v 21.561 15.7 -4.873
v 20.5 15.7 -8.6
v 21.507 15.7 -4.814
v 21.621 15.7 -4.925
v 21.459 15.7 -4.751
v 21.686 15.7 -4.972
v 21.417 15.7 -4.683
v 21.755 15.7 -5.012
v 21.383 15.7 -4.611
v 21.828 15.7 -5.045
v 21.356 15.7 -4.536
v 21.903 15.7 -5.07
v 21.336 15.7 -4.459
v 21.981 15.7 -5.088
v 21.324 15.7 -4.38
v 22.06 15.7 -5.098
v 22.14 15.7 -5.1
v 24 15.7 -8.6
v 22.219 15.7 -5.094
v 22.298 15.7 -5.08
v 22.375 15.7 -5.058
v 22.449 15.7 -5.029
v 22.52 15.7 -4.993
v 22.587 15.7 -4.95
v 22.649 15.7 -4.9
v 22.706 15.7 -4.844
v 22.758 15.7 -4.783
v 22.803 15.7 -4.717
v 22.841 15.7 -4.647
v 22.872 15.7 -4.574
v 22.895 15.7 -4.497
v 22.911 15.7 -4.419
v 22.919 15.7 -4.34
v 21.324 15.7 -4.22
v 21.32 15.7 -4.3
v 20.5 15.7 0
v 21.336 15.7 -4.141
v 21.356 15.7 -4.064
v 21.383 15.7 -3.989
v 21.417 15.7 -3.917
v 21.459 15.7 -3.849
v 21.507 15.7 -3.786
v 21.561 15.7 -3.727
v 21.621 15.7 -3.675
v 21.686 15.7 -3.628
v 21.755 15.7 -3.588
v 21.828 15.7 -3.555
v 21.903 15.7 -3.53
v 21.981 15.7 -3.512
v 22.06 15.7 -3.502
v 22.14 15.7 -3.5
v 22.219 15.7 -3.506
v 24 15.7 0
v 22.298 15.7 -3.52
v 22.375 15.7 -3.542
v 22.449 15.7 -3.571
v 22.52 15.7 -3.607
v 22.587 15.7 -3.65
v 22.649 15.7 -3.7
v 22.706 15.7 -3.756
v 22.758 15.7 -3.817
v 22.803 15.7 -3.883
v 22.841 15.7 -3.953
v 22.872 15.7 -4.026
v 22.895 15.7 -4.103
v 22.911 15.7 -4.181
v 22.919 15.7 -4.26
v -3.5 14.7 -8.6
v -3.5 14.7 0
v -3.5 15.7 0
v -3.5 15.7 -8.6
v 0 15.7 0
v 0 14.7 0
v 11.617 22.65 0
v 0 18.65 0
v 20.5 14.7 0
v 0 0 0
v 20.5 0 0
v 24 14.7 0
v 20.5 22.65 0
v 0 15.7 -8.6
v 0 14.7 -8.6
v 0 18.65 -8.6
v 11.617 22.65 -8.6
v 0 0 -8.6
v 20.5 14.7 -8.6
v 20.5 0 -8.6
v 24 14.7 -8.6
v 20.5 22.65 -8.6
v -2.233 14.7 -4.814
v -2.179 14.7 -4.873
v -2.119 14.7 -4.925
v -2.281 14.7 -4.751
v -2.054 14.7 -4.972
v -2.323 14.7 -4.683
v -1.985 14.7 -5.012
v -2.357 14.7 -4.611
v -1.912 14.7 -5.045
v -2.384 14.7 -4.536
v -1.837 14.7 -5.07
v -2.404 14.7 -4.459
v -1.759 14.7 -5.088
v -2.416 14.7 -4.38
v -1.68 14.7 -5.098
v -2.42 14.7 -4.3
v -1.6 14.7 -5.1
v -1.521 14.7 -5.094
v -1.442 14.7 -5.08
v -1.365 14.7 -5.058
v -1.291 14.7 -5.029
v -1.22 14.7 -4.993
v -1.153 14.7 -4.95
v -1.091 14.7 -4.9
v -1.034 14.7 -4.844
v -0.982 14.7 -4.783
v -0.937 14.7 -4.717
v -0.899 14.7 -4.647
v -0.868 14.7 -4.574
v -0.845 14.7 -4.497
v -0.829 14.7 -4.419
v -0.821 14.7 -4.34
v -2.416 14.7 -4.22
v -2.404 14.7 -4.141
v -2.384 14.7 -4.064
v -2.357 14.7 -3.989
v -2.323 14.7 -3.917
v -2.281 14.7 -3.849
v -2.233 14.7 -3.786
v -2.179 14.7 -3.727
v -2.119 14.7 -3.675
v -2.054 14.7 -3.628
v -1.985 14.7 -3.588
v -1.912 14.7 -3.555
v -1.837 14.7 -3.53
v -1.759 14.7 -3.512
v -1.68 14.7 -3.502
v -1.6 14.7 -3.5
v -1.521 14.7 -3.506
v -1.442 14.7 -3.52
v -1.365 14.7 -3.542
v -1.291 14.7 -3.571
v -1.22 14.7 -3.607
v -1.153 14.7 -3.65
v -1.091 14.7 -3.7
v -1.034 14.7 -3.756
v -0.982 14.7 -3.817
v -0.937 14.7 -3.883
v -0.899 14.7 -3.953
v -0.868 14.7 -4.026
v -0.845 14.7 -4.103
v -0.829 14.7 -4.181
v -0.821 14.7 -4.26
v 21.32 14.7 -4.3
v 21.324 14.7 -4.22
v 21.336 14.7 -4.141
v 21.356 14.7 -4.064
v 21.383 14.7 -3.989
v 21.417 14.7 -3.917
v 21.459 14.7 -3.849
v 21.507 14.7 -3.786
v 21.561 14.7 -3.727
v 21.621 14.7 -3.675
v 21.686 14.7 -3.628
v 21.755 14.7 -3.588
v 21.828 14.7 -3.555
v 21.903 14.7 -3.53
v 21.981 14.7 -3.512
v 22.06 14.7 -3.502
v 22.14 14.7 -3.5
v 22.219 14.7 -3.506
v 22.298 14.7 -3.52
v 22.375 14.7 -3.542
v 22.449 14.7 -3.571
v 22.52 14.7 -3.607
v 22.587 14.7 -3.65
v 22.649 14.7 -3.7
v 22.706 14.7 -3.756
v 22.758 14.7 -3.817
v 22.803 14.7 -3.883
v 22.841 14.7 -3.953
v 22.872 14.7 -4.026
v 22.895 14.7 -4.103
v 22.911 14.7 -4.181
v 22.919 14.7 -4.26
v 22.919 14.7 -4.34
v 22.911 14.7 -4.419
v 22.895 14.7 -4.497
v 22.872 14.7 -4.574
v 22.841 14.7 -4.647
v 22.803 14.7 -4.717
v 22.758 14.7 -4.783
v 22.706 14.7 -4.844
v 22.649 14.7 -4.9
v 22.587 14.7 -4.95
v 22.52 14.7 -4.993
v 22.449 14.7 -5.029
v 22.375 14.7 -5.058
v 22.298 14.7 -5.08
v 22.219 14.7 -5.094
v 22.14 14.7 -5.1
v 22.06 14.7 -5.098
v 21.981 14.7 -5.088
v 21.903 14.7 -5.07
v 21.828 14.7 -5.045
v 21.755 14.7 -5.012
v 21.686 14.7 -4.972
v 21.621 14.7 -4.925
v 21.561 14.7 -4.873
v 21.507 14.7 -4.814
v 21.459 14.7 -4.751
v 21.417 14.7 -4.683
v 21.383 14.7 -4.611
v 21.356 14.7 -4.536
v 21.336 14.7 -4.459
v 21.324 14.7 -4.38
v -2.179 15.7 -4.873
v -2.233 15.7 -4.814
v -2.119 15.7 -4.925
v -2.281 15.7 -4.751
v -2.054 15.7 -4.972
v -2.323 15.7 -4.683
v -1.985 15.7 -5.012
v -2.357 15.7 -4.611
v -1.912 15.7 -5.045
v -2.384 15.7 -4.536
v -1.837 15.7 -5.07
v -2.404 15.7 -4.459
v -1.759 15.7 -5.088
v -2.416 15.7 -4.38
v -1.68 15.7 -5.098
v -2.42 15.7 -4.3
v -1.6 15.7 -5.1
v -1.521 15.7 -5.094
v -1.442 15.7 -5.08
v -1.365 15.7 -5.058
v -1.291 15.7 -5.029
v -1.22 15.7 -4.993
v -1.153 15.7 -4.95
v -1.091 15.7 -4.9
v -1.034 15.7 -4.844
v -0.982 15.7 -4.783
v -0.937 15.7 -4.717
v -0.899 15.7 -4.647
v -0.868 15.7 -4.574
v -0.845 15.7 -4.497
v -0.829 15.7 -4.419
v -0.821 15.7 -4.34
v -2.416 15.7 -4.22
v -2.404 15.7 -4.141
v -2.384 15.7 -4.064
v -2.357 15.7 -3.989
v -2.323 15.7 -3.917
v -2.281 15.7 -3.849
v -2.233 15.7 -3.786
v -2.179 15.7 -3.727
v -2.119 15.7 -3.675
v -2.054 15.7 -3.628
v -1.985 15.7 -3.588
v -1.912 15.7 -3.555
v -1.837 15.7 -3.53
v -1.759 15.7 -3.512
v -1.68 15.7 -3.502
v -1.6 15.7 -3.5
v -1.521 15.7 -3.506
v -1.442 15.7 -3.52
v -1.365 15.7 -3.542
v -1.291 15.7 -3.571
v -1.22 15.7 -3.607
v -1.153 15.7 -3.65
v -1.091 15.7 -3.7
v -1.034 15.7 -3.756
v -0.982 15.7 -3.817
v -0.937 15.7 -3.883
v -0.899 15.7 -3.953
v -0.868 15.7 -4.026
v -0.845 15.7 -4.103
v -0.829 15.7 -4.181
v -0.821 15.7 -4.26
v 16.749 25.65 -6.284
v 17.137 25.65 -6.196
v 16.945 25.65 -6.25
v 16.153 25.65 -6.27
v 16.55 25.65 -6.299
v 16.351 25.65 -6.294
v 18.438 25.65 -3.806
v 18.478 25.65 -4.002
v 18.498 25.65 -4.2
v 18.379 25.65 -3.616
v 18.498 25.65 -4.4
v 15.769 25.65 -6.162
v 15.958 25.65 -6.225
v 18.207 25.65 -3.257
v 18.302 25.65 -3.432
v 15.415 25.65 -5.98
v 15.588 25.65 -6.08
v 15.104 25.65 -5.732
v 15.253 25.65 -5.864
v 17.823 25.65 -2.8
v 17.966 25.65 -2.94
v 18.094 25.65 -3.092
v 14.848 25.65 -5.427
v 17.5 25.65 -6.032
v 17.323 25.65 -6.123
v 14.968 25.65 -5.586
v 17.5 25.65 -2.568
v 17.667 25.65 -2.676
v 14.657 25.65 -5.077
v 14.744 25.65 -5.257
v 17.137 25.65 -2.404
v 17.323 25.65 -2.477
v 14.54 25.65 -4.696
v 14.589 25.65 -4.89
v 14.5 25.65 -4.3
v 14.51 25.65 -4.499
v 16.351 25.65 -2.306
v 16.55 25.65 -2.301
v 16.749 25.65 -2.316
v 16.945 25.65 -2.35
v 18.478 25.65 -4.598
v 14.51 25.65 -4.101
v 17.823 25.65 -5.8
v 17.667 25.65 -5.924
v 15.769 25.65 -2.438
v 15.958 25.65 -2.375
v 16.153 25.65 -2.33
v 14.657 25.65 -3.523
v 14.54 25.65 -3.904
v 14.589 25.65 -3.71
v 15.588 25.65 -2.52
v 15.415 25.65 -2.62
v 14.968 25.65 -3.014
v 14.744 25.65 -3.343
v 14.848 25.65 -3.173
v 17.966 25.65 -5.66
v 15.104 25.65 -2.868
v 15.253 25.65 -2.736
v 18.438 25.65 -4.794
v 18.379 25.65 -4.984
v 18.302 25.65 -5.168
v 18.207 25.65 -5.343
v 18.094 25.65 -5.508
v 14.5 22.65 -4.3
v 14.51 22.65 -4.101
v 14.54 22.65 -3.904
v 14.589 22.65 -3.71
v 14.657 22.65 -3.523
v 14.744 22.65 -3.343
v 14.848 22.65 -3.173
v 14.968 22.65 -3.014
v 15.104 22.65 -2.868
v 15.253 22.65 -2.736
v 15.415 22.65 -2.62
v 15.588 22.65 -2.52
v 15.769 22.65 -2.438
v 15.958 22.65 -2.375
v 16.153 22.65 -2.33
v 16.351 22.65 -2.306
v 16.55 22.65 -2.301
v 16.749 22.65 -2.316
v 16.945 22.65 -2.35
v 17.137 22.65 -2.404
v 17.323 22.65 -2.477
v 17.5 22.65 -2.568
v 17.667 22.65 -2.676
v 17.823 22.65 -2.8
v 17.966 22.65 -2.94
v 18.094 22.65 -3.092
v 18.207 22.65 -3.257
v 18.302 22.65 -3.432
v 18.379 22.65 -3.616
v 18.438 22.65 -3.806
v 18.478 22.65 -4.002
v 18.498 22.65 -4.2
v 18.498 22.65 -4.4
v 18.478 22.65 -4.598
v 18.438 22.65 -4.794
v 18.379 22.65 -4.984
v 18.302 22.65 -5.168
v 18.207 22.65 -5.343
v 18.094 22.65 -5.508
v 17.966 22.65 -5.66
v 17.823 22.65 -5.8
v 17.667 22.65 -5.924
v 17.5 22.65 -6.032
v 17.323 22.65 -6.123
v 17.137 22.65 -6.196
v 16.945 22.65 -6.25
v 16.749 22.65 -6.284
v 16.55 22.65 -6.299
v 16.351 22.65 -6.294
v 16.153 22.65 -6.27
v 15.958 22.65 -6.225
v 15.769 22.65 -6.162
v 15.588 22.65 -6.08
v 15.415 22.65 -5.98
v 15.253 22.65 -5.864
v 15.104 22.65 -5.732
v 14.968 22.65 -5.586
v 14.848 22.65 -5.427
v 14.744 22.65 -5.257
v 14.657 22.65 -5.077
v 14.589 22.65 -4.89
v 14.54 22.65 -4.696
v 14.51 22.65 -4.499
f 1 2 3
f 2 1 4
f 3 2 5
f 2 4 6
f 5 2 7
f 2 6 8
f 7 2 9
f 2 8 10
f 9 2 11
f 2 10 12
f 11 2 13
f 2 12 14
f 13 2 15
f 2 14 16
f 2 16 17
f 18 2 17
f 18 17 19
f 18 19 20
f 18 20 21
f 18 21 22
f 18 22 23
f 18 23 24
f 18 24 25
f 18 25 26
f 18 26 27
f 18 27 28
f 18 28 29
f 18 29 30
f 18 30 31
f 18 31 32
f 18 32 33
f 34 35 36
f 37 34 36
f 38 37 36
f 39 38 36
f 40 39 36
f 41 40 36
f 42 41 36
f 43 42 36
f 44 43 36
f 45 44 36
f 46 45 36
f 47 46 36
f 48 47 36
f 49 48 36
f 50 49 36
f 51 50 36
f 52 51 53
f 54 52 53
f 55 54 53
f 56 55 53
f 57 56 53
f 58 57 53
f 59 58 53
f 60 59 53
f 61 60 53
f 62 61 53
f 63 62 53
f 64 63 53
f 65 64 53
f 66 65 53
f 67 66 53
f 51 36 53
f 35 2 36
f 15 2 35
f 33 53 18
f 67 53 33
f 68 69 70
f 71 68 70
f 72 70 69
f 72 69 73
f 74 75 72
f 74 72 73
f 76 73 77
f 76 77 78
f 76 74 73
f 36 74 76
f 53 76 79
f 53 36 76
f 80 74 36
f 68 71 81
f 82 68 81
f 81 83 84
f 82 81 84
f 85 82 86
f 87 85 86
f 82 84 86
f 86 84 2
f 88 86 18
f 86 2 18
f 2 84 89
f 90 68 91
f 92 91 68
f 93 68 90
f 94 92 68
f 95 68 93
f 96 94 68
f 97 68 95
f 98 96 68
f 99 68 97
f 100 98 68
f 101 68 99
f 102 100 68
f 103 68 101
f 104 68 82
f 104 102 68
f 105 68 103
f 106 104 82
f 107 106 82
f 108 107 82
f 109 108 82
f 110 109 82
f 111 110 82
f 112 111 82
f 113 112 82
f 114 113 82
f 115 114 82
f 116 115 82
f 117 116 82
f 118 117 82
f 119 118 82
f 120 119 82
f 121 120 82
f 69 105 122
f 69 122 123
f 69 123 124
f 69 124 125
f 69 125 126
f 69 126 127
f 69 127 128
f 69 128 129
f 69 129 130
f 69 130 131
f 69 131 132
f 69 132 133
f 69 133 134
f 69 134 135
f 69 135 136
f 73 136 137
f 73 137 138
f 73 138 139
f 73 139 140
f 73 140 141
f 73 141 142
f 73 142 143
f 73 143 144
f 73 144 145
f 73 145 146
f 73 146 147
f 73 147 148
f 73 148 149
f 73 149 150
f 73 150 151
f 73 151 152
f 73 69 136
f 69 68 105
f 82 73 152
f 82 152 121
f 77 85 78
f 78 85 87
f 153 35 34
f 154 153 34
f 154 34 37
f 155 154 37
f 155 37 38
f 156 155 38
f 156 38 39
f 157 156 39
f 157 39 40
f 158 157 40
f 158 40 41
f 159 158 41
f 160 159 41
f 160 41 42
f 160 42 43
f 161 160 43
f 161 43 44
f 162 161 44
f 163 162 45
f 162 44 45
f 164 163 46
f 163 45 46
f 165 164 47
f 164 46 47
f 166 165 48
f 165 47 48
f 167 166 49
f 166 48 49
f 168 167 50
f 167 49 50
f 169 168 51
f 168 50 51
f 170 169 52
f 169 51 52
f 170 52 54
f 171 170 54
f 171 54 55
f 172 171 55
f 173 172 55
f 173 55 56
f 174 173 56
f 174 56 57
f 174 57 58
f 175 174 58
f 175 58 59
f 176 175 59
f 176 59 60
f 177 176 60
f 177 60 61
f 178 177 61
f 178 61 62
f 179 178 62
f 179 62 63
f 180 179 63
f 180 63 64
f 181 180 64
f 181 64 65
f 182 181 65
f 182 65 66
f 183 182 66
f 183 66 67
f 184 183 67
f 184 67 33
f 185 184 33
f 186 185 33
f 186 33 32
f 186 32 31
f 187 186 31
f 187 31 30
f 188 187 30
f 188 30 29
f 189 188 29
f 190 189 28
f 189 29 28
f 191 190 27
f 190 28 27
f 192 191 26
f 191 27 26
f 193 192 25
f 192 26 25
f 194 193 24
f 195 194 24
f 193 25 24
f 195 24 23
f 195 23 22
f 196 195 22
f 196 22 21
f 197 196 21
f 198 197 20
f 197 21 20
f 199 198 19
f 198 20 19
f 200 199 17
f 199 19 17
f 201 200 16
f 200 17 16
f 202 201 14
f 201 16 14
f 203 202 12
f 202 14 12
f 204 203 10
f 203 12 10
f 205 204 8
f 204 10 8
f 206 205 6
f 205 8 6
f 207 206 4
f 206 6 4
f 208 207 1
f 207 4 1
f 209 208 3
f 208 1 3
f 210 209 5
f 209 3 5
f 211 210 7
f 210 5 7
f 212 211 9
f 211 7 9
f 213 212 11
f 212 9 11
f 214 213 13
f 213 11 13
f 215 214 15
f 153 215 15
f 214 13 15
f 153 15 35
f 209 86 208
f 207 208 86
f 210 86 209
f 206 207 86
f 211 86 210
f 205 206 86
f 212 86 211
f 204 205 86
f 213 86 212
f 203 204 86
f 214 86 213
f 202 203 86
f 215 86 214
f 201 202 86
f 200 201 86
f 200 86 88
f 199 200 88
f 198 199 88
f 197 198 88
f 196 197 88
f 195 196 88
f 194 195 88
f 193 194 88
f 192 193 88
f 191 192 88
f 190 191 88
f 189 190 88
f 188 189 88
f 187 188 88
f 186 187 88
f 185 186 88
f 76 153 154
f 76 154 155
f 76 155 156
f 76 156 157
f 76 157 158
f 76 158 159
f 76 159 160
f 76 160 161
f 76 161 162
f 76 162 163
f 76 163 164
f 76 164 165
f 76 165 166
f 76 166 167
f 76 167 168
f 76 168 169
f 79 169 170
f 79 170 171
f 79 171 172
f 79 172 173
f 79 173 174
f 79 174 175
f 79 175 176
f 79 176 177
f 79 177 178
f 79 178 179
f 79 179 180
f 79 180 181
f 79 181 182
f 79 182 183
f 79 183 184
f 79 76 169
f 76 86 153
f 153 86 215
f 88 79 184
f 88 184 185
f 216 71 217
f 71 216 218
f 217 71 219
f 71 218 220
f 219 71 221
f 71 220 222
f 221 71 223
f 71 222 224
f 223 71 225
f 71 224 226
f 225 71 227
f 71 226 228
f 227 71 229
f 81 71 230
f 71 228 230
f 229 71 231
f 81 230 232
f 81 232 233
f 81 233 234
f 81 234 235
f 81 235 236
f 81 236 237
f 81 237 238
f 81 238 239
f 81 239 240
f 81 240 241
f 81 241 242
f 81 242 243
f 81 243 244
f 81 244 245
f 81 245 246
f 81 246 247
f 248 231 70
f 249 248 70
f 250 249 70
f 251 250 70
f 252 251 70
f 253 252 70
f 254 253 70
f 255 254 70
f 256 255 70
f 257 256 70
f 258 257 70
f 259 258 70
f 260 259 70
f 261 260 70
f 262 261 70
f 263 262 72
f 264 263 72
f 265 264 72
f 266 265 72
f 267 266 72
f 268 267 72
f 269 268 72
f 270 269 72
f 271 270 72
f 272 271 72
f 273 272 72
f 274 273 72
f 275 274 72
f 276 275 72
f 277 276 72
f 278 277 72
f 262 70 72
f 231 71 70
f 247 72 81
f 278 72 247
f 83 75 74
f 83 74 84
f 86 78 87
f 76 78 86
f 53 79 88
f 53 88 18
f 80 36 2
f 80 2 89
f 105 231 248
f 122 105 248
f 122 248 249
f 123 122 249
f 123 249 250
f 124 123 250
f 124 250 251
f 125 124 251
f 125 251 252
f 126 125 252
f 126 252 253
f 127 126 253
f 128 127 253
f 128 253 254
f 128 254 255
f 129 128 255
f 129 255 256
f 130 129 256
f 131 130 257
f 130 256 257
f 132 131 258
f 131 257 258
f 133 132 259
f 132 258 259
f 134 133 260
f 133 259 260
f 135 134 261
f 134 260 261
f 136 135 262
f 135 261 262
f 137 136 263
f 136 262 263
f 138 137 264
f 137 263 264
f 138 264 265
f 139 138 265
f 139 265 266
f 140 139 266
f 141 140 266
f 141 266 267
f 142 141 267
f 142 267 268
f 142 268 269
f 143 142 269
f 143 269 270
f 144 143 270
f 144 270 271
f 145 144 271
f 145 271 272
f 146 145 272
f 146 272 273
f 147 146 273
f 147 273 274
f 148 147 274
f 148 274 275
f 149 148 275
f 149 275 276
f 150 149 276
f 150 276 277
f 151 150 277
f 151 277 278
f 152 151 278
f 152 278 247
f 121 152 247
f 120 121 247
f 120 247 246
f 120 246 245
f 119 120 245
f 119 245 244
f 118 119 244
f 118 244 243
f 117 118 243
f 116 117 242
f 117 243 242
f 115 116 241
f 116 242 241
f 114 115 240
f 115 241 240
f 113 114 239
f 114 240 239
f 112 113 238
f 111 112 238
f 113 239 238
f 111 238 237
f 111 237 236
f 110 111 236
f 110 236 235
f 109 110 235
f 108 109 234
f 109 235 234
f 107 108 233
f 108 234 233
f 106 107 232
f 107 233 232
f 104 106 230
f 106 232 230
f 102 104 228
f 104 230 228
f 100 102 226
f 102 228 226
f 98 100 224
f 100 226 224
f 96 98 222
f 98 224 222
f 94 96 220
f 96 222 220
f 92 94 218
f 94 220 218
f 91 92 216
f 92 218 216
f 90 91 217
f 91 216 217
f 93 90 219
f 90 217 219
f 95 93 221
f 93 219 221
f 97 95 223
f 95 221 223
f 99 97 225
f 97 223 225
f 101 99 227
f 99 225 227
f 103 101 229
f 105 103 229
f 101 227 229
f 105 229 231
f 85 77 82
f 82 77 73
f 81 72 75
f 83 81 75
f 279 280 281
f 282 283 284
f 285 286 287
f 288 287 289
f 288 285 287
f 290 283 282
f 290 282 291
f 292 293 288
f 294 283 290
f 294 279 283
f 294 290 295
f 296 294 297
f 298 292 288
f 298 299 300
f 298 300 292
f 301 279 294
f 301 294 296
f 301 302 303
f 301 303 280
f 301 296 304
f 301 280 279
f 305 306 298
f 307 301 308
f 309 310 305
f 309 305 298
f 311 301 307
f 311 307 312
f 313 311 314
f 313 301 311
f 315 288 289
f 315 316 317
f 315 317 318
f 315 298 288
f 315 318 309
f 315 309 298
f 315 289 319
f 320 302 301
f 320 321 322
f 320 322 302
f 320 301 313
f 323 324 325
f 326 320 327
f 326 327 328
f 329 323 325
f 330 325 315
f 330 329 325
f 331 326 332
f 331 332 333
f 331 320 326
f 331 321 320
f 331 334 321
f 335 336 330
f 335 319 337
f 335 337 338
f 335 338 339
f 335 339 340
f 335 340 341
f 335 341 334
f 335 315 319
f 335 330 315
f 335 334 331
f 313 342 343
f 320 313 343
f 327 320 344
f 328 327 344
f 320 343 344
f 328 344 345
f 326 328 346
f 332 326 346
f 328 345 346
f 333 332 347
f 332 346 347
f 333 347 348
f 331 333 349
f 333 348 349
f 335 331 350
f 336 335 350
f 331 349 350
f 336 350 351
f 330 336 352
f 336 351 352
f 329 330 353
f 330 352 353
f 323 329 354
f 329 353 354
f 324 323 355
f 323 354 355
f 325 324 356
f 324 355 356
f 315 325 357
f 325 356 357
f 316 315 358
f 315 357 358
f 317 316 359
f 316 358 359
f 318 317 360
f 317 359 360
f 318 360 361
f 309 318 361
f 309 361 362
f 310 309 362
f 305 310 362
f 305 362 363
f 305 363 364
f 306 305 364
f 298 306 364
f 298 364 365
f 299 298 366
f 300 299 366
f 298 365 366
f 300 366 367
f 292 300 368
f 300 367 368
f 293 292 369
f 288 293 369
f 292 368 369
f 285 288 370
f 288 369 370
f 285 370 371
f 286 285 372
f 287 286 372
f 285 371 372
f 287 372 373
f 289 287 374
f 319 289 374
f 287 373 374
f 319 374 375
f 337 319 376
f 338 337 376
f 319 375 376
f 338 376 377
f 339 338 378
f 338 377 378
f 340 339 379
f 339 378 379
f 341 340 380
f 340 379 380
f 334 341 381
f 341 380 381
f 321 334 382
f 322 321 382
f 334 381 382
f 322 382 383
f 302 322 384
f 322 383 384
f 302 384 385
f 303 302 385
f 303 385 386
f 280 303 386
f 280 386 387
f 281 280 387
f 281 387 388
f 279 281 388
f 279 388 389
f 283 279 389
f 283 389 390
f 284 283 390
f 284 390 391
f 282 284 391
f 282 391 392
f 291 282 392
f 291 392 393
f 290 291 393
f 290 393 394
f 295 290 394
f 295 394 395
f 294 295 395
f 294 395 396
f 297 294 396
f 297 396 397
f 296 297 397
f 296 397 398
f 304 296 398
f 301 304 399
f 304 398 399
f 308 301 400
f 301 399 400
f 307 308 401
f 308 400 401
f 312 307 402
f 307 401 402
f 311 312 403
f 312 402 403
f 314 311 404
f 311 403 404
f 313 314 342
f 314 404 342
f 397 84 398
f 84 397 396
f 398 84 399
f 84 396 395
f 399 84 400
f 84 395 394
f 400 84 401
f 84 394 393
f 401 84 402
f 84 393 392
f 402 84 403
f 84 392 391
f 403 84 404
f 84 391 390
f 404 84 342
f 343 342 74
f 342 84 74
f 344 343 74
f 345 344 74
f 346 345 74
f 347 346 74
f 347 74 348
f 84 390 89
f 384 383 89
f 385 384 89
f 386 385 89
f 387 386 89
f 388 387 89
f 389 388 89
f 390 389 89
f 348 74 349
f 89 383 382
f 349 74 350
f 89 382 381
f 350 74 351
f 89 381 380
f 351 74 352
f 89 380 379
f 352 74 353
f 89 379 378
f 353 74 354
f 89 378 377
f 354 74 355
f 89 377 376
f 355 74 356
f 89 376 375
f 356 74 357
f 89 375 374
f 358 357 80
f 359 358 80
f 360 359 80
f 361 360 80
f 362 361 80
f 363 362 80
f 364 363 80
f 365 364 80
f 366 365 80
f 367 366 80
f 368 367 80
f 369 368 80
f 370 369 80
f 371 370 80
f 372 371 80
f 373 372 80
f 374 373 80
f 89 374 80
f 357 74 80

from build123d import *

# Parameters (mm, degrees)
SKETCH_1_W          = 20.5
SKETCH_1_H          = 8.6
EXTRUDE_1_DEPTH     = 15.2
SKETCH_2_W          = 20.5
SKETCH_2_H          = 7.45
EXTRUDE_2_DEPTH     = 8.6
CHAMFER_1_SIZE      = 4
CHAMFER_1_SIZE2     = 11.616843511
SKETCH_3_W          = 3.5
SKETCH_3_H          = 1
EXTRUDE_3_DEPTH     = 8.6
SKETCH_4_R          = 0.8
CUT_EXTRUDE_1_DEPTH = 8.6
SKETCH_5_R          = 2
EXTRUDE_4_DEPTH     = 3


with BuildPart() as part:
    # 草图1 → 凸台-拉伸1 (new body)
    with BuildSketch(Plane(origin=(0, 0, 0), x_dir=(1, 0, 0), z_dir=(0, 1, 0))):
        with Locations((10.25, 4.3)):
            Rectangle(SKETCH_1_W, SKETCH_1_H)
    extrude(amount=EXTRUDE_1_DEPTH)

    # 草图2 → 凸台-拉伸2 (add)
    with BuildSketch(Plane.XY):
        with Locations((10.25, 18.925)):
            Rectangle(SKETCH_2_W, SKETCH_2_H)
    extrude(amount=-EXTRUDE_2_DEPTH)

    # 倒角1
    chamfer_1_edges = [part.edges().sort_by_distance(p)[0] for p in [
        (0, 22.65, -4.3),
    ]]
    chamfer_1_side = [part.faces().sort_by_distance(p)[0] for p in [
        (0, 11.325, -4.3),
    ]]
    chamfer(chamfer_1_edges, length=CHAMFER_1_SIZE, length2=CHAMFER_1_SIZE2, reference=chamfer_1_side[0])

    # 草图3 → 凸台-拉伸3 (add)
    with BuildSketch(Plane.XY):
        with Locations((-1.75, 15.2)):
            Rectangle(SKETCH_3_W, SKETCH_3_H)
        with Locations((22.25, 15.2)):
            Rectangle(SKETCH_3_W, SKETCH_3_H)
    extrude(amount=-EXTRUDE_3_DEPTH)

    # 草图4 → 切除-拉伸1 (cut)
    with BuildSketch(Plane(origin=(0, 15.7, 0), x_dir=(1, 0, 0), z_dir=(0, 1, 0))):
        with Locations(Location((-1.62, 4.3, 0), (0, 0, 180))):
            Circle(SKETCH_4_R)
        with Locations(Location((22.12, 4.3, 0), (0, 0, 180))):
            Circle(SKETCH_4_R)
    extrude(amount=-CUT_EXTRUDE_1_DEPTH, mode=Mode.SUBTRACT)

    # 草图5 → 凸台-拉伸4 (add)
    with BuildSketch(Plane(origin=(0, 22.65, 0), x_dir=(1, 0, 0), z_dir=(0, 1, 0))):
        with Locations(Location((16.5, 4.3, 0), (0, 0, 180))):
            Circle(SKETCH_5_R)
    extrude(amount=EXTRUDE_4_DEPTH)


solid = part.part
